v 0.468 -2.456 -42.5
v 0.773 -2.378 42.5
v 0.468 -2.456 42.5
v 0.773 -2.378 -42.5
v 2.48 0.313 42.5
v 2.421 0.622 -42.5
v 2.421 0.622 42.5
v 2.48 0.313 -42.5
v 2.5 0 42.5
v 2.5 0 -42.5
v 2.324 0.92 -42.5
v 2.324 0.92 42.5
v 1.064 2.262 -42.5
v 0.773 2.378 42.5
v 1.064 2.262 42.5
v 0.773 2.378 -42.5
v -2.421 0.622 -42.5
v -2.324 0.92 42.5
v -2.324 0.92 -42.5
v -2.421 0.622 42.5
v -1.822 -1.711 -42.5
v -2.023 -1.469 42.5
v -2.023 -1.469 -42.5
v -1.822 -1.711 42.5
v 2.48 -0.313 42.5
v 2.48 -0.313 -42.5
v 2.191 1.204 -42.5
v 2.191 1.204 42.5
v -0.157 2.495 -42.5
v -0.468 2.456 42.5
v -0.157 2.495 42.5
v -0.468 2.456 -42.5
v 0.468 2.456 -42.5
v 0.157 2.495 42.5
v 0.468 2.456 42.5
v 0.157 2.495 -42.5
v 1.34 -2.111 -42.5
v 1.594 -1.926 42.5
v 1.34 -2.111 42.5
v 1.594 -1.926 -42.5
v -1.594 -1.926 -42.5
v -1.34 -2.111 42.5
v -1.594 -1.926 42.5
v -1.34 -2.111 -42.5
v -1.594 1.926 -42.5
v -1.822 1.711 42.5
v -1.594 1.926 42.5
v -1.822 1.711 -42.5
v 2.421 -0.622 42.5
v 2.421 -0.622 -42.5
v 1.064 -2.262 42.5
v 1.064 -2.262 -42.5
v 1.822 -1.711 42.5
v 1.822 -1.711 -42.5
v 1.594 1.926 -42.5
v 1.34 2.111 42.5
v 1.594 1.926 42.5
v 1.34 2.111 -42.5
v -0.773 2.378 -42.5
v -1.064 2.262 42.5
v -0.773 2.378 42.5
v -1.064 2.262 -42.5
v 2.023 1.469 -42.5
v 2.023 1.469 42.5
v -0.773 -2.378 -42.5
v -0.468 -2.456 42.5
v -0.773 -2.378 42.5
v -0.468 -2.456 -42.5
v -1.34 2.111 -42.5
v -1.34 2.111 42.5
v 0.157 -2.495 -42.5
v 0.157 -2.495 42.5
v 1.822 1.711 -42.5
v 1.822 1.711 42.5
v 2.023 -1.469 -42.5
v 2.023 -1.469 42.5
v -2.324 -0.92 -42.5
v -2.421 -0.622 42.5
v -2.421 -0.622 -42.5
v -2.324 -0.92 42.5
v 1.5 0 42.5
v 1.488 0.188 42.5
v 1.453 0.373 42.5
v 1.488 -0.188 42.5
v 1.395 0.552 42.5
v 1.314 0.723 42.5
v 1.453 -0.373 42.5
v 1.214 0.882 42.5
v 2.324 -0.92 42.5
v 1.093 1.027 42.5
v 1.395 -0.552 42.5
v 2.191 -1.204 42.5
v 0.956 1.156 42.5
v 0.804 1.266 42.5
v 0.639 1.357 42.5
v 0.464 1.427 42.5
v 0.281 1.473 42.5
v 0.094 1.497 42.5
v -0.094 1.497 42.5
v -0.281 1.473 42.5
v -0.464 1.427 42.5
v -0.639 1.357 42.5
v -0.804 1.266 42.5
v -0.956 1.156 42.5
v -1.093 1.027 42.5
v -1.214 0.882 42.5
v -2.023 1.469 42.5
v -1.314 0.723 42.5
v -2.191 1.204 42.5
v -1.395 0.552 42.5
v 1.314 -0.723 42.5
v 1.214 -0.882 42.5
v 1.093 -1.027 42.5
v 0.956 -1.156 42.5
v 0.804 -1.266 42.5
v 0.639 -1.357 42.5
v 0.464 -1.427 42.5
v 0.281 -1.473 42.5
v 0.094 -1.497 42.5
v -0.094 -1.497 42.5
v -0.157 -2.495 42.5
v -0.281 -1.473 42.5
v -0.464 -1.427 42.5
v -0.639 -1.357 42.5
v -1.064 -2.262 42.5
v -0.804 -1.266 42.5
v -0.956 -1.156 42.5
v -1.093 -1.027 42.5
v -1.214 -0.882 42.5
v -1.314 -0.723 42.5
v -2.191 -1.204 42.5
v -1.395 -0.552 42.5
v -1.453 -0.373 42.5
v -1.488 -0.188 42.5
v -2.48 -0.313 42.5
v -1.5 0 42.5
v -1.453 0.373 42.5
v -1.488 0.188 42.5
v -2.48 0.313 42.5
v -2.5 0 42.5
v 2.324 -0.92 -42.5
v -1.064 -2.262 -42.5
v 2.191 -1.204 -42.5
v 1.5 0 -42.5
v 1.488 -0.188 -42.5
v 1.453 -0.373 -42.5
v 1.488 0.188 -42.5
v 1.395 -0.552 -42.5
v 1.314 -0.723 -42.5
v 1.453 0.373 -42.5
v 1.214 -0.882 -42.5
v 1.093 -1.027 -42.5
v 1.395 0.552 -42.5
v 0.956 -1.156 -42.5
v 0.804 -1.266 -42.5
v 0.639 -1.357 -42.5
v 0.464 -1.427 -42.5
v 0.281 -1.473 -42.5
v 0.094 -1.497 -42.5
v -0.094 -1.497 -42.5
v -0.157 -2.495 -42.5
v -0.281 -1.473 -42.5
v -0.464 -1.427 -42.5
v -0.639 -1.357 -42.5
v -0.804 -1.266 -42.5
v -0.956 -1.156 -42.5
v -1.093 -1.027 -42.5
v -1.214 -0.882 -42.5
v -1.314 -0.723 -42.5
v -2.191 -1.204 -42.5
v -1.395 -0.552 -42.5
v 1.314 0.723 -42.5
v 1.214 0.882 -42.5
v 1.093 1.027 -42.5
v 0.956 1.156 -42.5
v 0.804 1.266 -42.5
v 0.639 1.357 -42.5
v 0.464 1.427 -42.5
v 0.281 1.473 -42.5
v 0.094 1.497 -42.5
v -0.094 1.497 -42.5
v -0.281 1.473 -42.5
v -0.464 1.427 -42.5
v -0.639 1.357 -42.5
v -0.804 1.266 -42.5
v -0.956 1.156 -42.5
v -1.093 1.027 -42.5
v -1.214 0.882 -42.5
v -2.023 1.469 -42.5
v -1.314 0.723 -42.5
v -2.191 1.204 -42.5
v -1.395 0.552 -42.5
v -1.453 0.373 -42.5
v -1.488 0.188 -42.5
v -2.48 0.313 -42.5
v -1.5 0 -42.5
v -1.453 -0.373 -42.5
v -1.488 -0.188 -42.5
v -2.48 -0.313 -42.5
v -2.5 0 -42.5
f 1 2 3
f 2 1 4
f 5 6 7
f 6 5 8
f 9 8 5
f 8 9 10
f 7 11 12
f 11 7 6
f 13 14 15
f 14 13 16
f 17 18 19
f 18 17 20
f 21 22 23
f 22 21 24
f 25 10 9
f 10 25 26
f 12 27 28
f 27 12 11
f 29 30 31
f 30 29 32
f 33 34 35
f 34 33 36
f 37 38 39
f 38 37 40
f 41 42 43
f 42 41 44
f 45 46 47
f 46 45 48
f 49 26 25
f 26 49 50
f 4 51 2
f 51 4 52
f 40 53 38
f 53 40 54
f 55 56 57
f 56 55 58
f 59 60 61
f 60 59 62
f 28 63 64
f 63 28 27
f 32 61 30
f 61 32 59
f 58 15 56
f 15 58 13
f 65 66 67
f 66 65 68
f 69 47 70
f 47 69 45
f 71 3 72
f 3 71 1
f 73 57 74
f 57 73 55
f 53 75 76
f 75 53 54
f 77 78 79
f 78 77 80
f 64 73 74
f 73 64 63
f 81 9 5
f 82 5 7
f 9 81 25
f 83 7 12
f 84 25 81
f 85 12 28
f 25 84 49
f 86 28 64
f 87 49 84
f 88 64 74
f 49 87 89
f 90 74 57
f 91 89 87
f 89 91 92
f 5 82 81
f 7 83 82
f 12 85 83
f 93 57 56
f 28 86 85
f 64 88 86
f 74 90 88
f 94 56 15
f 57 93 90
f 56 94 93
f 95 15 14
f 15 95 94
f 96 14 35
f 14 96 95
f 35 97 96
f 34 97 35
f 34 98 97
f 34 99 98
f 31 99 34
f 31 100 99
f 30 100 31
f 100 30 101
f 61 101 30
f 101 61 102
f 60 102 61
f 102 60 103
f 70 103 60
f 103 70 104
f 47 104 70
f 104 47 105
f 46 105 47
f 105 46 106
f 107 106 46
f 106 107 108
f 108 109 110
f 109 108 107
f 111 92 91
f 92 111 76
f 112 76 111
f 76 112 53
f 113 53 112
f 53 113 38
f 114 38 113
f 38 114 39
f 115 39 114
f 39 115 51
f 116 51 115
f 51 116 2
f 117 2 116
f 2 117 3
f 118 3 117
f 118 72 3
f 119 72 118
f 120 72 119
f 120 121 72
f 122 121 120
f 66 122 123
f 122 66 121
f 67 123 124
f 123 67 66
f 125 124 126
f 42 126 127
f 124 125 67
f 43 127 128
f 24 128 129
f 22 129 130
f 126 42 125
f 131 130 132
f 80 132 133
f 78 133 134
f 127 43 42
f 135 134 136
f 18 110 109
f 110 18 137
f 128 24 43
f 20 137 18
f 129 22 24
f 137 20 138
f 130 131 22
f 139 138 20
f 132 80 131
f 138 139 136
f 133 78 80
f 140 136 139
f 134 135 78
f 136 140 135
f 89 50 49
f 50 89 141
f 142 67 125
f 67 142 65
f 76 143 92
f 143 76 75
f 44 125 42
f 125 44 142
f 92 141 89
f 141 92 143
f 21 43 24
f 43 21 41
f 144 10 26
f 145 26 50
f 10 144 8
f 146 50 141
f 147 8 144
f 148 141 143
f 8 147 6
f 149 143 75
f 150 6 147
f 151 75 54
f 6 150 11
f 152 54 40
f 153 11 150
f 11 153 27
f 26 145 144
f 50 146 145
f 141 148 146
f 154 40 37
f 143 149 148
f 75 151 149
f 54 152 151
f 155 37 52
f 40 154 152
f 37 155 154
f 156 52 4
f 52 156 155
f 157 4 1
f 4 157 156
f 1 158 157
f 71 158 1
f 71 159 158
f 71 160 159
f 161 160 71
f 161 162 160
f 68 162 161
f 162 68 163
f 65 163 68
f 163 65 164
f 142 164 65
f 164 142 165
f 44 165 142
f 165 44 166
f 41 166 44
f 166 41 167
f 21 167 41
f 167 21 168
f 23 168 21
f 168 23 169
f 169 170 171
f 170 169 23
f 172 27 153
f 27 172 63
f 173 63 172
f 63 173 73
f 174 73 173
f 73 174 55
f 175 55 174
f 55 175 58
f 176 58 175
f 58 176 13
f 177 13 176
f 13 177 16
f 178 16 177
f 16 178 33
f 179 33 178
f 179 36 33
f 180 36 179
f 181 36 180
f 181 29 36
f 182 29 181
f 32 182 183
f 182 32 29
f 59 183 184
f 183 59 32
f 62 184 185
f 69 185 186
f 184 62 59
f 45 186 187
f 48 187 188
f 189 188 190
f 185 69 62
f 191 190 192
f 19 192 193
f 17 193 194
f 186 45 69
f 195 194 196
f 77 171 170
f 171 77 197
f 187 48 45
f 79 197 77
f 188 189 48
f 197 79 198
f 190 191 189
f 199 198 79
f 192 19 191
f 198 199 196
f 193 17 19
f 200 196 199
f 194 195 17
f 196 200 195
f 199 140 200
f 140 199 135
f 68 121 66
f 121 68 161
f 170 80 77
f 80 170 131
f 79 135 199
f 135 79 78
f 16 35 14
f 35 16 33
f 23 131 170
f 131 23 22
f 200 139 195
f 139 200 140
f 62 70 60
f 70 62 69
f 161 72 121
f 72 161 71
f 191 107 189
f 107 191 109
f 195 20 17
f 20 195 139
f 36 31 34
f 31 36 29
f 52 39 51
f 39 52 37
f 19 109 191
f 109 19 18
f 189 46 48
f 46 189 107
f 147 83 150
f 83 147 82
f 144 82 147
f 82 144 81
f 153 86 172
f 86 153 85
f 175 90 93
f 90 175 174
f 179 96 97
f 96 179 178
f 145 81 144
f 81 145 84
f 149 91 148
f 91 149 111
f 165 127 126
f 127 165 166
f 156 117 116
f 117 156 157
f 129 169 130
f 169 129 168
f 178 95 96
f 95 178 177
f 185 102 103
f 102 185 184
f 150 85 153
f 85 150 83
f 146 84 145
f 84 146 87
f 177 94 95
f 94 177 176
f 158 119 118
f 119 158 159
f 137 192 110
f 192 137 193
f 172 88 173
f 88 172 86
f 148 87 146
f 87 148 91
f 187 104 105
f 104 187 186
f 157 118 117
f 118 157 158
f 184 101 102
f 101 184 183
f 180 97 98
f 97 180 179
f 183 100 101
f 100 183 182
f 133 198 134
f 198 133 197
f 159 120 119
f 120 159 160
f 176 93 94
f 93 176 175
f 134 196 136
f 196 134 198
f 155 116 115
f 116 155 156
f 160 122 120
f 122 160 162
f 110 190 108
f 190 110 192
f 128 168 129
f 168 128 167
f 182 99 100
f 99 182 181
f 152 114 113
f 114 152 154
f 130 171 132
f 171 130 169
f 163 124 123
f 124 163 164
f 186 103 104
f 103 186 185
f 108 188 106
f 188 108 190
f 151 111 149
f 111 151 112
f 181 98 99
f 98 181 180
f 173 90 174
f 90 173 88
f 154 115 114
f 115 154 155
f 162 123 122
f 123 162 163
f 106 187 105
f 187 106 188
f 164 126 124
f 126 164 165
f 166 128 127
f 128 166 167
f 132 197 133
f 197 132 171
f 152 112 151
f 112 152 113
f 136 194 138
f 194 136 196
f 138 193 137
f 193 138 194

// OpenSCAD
$fn = 50;


difference() {
	union() {
		translate(v = [0, 0, -42.5000000000]) {
			cylinder(h = 85, r = 2.5000000000);
		}
	}
	union() {
		translate(v = [0, 0, -100.0000000000]) {
			cylinder(h = 200, r = 1.5000000000);
		}
	}
}
